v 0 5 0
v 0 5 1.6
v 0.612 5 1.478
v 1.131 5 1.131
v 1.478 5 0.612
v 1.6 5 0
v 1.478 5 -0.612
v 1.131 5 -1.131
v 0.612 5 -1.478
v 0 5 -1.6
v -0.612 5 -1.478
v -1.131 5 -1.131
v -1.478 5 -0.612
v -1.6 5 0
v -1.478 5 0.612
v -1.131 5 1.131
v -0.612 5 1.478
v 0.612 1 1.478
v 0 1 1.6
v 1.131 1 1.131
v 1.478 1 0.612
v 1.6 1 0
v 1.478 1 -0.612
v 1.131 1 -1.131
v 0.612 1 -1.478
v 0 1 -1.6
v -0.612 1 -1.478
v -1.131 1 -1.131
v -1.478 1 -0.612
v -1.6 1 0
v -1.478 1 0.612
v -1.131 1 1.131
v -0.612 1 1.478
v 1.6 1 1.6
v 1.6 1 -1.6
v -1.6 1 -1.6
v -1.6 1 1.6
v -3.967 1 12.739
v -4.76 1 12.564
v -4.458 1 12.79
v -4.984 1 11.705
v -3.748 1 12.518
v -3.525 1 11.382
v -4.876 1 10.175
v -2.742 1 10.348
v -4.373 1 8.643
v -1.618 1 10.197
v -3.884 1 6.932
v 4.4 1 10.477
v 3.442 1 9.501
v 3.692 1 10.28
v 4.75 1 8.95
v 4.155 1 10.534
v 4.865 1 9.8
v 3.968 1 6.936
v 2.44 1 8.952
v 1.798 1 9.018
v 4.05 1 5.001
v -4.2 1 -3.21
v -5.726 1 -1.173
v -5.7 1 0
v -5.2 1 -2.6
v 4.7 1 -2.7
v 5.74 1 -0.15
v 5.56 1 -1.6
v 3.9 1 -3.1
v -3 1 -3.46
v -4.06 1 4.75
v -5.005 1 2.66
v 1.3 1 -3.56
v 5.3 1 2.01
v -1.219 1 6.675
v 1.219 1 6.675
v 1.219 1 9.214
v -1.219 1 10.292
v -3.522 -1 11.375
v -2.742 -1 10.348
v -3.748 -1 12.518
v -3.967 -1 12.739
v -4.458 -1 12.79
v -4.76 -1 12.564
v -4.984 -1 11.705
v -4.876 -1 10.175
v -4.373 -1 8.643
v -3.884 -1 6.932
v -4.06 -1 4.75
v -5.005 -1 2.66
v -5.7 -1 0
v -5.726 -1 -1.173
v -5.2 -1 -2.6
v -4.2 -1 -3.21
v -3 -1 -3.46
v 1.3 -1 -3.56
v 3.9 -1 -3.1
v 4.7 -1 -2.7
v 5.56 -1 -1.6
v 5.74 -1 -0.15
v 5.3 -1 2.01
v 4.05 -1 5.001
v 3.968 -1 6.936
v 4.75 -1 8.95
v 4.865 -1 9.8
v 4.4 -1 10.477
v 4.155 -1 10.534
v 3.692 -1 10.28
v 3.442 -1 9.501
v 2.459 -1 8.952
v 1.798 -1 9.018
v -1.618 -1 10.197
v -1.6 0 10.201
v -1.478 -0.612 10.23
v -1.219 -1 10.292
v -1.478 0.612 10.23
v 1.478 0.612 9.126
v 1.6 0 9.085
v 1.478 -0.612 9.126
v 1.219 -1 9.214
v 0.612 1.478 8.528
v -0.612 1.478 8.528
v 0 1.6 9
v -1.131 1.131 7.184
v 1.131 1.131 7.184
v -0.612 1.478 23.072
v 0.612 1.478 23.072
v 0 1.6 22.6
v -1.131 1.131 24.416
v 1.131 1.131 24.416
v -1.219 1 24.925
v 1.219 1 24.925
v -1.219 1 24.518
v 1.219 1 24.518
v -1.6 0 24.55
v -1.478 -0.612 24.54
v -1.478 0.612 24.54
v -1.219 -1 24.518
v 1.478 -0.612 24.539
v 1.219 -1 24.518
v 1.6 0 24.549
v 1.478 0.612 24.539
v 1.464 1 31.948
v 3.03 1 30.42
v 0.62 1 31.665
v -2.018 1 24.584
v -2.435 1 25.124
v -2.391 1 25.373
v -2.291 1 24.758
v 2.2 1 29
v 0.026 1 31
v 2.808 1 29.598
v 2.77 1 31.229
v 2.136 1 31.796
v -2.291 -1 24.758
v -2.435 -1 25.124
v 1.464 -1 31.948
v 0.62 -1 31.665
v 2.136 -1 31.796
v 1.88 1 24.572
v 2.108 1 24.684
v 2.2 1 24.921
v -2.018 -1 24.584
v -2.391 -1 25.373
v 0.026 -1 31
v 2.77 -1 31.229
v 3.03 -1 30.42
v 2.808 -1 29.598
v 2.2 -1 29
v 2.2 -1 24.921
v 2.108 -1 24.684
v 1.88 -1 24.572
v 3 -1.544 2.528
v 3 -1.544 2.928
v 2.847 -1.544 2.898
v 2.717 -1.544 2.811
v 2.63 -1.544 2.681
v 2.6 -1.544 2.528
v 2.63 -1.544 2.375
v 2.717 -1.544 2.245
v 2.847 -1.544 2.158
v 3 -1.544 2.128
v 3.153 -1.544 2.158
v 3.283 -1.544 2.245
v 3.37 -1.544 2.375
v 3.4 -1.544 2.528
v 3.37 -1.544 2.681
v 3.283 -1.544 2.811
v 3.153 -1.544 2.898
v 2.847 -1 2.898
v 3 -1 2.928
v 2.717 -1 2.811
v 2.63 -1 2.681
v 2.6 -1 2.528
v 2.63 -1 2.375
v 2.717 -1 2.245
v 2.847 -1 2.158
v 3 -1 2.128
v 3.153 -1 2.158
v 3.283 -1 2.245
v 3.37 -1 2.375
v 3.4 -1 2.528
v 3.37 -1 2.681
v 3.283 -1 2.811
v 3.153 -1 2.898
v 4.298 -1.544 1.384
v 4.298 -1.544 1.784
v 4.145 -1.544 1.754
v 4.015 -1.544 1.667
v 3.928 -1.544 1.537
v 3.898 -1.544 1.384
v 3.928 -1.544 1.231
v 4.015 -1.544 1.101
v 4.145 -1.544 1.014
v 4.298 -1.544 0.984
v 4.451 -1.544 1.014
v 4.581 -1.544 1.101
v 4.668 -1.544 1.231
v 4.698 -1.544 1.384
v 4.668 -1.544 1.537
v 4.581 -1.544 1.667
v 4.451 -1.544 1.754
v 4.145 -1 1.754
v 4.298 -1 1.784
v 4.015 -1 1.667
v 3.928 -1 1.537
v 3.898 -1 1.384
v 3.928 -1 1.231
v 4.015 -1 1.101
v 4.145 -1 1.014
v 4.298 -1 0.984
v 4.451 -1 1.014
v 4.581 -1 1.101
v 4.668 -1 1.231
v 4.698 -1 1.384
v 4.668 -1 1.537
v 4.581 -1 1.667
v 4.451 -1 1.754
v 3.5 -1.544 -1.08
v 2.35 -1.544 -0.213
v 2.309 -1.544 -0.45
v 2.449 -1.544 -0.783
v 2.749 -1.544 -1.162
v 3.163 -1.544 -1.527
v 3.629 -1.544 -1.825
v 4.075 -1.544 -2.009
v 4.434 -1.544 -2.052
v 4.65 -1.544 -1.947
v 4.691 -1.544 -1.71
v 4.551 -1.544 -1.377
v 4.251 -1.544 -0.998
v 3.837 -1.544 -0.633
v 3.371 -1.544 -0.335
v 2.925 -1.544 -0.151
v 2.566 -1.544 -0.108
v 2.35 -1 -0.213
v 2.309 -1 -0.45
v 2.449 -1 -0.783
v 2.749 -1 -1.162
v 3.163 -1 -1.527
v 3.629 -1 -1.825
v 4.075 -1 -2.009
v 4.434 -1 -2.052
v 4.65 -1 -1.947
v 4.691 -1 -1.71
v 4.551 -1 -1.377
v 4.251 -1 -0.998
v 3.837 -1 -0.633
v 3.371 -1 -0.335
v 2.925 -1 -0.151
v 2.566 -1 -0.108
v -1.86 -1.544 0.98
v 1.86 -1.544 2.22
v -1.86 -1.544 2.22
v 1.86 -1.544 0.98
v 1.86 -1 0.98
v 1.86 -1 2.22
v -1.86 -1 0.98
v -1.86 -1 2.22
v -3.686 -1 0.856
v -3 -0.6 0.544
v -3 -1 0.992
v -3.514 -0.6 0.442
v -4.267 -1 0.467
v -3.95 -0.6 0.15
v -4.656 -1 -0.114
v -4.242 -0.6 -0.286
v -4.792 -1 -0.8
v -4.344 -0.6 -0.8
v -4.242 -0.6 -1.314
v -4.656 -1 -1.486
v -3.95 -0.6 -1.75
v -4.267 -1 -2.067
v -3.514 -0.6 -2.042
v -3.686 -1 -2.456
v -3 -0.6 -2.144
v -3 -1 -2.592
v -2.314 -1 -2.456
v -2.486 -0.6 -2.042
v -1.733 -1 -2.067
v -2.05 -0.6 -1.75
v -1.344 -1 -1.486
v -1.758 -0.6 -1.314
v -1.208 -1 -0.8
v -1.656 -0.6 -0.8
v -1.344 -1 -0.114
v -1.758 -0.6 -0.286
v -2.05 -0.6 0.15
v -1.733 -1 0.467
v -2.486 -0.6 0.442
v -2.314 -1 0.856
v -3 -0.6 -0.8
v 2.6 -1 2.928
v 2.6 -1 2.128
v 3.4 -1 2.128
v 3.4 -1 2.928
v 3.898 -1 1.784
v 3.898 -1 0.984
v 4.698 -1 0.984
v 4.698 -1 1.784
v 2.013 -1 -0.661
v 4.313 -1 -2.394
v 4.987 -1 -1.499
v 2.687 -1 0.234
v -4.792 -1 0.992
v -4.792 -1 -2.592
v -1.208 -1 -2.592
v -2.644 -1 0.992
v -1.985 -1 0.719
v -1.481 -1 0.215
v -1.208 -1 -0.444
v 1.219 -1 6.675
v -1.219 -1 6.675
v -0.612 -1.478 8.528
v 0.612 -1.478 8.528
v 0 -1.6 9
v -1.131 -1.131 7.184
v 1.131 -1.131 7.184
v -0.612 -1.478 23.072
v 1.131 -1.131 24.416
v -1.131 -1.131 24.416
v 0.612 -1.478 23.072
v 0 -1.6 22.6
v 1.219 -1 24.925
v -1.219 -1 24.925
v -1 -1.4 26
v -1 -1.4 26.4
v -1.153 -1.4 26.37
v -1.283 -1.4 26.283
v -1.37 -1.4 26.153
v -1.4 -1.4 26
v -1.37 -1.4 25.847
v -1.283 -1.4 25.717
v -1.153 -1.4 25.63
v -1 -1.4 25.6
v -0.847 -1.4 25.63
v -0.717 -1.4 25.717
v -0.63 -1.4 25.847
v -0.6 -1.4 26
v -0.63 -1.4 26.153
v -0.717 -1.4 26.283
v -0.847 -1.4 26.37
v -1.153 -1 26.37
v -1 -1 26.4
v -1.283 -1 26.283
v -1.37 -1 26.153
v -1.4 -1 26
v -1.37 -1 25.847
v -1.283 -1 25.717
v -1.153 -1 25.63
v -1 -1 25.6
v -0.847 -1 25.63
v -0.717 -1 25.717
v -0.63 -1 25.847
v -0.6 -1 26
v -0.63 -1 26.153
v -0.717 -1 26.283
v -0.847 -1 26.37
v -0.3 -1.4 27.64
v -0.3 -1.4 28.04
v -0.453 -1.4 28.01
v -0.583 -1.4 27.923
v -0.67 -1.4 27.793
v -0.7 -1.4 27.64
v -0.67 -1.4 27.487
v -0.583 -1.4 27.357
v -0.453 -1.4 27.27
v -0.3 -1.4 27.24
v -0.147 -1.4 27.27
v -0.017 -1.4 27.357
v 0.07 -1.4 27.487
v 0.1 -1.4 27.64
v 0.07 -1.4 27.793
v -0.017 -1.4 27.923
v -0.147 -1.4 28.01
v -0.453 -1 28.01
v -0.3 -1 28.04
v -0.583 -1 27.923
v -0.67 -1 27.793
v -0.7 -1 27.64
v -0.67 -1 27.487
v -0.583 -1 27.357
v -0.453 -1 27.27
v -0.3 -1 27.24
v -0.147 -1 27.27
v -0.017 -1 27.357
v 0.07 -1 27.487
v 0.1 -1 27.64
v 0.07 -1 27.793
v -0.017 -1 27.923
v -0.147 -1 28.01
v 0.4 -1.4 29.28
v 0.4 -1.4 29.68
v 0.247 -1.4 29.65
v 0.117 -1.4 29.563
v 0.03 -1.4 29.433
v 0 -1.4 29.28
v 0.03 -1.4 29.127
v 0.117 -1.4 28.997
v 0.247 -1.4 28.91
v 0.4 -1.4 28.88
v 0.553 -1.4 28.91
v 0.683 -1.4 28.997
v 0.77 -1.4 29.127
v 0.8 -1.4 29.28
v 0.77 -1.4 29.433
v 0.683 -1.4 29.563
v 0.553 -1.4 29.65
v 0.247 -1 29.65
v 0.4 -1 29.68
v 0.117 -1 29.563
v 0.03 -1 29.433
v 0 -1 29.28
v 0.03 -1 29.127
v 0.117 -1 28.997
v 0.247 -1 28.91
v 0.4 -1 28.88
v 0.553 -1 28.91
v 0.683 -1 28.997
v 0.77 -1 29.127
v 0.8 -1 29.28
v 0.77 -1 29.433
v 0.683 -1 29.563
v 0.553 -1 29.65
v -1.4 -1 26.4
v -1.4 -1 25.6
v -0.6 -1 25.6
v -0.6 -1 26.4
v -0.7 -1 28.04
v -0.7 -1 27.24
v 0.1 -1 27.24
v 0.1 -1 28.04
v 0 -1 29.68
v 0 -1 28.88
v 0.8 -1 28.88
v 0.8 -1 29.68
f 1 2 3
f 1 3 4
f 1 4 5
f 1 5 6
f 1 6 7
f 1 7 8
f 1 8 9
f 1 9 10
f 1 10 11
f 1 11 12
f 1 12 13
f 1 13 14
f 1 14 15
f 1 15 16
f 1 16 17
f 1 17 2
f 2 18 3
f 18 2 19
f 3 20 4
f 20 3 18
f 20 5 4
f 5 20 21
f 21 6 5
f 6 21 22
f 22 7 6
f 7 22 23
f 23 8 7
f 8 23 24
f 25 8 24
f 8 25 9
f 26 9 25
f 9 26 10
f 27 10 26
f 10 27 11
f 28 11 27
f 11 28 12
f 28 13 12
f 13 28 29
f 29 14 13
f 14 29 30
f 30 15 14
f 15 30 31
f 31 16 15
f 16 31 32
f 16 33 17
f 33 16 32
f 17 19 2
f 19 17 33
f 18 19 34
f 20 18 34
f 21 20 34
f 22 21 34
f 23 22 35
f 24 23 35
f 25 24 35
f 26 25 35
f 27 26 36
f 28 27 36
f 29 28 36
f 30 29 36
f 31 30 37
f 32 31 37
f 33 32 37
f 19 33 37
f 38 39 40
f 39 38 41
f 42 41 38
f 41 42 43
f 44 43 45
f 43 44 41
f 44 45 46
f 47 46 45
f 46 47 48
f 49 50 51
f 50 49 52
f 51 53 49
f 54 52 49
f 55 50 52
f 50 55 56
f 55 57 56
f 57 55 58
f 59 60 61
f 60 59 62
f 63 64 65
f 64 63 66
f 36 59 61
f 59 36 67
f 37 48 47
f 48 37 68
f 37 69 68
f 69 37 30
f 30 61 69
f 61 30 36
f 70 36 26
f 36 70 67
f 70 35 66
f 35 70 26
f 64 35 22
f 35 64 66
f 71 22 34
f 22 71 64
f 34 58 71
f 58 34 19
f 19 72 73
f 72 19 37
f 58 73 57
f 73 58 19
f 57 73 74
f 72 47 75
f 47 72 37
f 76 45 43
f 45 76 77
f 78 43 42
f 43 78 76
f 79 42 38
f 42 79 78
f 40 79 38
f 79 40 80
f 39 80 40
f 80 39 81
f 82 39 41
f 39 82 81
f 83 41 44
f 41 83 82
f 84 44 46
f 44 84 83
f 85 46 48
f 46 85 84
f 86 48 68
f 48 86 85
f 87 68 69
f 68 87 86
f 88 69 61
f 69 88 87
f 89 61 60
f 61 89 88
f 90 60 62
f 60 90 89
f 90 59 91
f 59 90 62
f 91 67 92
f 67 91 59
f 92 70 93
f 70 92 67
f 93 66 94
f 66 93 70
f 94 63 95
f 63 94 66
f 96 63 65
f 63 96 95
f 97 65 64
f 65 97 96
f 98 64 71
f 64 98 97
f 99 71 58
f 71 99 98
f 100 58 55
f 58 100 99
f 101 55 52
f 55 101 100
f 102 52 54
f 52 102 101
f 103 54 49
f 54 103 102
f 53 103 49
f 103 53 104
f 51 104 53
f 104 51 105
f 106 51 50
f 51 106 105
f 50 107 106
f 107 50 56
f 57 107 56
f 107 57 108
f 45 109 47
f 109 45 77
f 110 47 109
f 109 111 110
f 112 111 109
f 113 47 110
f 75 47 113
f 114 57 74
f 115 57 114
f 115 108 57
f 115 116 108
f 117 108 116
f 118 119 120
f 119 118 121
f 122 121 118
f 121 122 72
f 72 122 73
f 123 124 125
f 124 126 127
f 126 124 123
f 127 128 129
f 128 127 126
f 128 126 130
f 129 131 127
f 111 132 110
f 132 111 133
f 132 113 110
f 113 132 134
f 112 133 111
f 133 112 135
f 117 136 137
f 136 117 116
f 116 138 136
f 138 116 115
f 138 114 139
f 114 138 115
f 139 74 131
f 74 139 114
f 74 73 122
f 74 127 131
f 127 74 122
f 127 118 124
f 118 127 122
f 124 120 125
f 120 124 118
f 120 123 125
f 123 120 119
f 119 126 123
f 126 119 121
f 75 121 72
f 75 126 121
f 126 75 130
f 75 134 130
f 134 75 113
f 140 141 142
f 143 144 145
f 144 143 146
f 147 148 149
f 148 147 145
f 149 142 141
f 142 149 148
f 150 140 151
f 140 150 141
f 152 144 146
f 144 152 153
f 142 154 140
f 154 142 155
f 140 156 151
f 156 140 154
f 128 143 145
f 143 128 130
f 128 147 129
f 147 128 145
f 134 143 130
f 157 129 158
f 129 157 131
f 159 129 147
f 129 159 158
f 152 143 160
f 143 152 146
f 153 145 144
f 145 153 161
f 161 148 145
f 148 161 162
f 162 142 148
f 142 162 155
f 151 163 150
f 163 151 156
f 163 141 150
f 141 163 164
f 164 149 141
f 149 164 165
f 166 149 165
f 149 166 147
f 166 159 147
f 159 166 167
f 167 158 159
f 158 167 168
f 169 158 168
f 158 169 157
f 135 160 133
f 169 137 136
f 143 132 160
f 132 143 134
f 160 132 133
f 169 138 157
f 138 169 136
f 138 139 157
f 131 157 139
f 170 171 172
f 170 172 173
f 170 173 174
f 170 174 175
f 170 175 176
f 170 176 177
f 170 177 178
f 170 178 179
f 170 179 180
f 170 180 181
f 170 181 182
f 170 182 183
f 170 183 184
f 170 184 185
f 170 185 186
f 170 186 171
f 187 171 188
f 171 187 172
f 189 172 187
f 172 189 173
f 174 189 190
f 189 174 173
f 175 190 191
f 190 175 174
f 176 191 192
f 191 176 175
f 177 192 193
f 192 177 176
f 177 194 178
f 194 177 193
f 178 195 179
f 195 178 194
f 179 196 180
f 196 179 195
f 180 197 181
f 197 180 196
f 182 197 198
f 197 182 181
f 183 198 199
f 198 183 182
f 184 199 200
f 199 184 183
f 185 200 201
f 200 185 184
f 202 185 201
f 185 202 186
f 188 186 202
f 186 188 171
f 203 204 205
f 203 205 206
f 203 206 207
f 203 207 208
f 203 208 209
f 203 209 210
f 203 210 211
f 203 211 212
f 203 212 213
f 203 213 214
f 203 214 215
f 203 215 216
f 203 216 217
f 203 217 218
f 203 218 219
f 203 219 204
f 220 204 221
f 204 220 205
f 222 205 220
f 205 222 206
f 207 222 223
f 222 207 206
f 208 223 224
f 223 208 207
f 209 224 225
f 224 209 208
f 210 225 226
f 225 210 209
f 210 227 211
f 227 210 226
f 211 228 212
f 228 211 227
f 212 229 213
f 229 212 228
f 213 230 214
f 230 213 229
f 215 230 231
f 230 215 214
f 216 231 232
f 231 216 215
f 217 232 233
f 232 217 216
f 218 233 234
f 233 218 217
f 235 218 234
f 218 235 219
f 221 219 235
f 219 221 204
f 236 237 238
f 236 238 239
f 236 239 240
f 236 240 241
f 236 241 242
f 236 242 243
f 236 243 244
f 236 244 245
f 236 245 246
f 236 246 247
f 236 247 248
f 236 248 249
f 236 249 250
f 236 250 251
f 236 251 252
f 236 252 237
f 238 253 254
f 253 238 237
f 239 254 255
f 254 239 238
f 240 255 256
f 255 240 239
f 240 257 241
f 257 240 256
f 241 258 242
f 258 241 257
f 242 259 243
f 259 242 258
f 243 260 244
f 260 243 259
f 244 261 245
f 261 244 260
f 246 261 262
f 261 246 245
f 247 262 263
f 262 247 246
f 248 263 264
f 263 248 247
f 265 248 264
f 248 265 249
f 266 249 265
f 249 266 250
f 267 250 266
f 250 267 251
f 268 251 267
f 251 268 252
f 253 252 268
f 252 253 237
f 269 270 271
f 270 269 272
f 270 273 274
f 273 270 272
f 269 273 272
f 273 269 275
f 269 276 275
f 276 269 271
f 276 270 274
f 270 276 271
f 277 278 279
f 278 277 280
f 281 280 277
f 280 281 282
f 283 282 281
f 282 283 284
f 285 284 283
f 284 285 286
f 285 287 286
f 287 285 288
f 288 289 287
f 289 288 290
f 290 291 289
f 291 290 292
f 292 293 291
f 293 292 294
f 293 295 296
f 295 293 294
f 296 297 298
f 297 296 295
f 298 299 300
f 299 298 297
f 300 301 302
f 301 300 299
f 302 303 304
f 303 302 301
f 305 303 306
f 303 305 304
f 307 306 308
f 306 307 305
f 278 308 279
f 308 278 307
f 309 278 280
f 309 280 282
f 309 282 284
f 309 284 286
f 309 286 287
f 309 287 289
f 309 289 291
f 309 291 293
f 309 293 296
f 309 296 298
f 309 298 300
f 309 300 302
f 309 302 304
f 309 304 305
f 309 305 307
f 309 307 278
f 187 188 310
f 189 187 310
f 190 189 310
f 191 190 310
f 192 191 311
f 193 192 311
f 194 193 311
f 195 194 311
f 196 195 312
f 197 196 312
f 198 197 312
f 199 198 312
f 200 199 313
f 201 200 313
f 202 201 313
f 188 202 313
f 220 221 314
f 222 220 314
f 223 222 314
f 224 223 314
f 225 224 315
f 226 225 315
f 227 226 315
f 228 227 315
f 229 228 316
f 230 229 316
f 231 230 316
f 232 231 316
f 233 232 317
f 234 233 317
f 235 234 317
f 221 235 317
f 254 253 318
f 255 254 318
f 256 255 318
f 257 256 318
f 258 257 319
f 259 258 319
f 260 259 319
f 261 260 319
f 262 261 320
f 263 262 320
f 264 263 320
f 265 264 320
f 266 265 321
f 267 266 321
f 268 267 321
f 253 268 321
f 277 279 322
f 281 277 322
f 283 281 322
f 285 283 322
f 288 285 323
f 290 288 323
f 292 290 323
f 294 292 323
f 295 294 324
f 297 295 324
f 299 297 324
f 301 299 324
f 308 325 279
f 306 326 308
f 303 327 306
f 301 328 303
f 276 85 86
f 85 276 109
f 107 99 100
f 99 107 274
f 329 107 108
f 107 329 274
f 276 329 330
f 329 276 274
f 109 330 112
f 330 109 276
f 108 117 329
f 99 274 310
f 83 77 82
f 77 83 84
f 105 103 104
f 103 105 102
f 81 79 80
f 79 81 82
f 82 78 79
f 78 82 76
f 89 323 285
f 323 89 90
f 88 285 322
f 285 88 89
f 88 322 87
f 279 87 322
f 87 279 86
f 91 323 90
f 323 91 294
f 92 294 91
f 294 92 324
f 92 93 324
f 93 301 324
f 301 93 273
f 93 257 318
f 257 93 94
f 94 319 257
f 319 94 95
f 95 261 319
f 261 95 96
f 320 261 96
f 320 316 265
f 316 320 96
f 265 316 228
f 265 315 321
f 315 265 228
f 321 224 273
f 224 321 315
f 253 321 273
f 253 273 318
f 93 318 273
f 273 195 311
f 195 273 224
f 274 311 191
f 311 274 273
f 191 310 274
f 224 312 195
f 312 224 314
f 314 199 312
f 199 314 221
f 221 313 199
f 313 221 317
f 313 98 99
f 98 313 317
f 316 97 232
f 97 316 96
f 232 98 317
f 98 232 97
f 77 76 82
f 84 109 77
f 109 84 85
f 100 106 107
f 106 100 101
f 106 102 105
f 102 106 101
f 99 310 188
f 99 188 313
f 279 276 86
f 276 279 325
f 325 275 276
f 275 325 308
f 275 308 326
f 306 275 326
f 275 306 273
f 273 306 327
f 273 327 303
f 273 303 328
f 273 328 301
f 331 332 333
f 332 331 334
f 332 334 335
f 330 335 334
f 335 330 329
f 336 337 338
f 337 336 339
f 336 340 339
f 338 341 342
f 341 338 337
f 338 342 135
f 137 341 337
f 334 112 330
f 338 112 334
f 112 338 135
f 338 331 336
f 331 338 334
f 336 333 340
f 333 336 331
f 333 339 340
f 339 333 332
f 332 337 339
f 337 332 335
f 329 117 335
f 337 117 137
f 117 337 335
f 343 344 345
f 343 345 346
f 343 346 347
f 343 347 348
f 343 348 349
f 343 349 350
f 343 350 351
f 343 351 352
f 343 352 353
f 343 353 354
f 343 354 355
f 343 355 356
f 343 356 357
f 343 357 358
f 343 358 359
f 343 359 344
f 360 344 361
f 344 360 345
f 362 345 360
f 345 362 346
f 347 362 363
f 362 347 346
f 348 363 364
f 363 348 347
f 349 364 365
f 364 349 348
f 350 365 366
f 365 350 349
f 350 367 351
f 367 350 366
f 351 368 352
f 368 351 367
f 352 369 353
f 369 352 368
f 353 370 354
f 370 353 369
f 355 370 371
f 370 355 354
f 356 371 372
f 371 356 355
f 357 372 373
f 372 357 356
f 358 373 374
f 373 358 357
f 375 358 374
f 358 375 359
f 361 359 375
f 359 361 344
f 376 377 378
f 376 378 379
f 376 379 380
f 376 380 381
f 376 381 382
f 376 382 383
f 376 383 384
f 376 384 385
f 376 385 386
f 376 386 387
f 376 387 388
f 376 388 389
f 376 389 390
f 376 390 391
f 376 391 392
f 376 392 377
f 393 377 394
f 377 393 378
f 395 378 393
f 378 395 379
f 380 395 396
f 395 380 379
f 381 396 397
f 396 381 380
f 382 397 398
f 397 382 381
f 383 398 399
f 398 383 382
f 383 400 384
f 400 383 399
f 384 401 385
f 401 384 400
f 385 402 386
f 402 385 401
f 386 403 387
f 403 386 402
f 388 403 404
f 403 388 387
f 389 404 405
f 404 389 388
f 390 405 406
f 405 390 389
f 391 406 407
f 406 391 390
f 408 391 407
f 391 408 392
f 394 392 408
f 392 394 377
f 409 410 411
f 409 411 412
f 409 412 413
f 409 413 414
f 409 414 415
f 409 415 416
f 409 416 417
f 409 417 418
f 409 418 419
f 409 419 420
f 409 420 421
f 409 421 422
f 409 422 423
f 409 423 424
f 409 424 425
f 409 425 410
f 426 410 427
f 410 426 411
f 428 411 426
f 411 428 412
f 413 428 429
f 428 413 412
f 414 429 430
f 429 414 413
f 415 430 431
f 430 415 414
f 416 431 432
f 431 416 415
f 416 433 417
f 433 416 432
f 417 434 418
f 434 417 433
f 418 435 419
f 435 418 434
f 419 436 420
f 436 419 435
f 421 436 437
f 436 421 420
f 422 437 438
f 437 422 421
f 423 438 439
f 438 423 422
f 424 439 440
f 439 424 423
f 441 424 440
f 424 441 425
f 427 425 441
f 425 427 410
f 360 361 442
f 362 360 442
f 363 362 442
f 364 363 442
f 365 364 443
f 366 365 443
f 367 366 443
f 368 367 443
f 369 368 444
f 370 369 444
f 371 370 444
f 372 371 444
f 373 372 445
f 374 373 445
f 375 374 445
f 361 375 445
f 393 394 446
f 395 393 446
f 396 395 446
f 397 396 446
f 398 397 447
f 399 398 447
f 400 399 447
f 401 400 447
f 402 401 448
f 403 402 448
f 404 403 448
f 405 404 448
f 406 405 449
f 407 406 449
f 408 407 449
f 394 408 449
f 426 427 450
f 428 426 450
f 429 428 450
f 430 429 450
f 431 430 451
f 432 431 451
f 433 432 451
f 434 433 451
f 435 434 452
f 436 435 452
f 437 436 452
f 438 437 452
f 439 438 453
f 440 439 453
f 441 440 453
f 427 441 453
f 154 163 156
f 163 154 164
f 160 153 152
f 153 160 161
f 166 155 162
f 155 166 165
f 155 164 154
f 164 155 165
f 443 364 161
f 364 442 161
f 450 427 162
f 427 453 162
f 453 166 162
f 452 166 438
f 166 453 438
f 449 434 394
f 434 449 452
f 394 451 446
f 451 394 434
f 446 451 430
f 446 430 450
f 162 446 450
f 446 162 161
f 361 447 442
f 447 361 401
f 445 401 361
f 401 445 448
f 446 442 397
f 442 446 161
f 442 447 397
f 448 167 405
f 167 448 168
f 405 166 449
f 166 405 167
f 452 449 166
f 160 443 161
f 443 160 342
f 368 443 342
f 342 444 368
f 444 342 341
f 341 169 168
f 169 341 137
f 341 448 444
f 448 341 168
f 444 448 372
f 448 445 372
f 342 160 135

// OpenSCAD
use <../lib.scad>
use <../p/1-4tang.scad>
use <../p/3-4ndis.scad>
use <../p/4-4con3.scad>
use <../p/4-4cylc.scad>
use <../p/4-4disc.scad>
use <../p/4-4edge.scad>
use <../p/4-4ndis.scad>
use <../p/box5.scad>
use <s/11640s01.scad>
function ldraw_lib__11640() = [
// 0 Minifig Electric Guitar Classic
// 0 Name: 11640.dat
// 0 Author: Evert-Jan Boer [ejboer]
// 0 !LDRAW_ORG Part UPDATE 2022-01
// 0 !LICENSE Licensed under CC BY 2.0 and CC BY 4.0 : see CAreadme.txt
// 
// 0 BFC CERTIFY CCW
  [0,"BFC","CERTIFY"],
  [0,"BFC","CCW"],
// 
// 0 !CATEGORY Minifig Accessory
// 
// 0 !HISTORY 2013-08-14 {LEGO Digital Designer} Original part shape
// 0 !HISTORY 2017-03-08 [ejboer] File preparation for LDraw Parts Tracker
// 0 !HISTORY 2018-12-08 [PTadmin] Official Update 2018-02
// 0 !HISTORY 2021-10-05 [RainbowDolphin] Fixed surface overlap
// 0 !HISTORY 2022-01-14 [PTadmin] Official Update 2022-01
// 
// 
// 1 16 0 0 0 1 0 0 0 1 0 0 0 1 s\11640s01.dat
  [1,16,0,0,0,1,0,0,0,1,0,0,0,1, ldraw_lib__s__11640s01()],
// 
// 0 // Body
// 1 16 7.5 -6.32 -3.86 0 0 -1 -1 0 0 0 1.36 0 4-4cylc.dat
  [1,16,7.5,-6.32,-3.86,0,0,-1,-1,0,0,0,1.36,0, ldraw_lib__4_4cylc()],
// 1 16 10.745 -3.46 -3.86 0 0 -1 -1 0 0 0 1.36 0 4-4cylc.dat
  [1,16,10.745,-3.46,-3.86,0,0,-1,-1,0,0,0,1.36,0, ldraw_lib__4_4cylc()],
// 1 16 8.75 2.7 -3.86 -2.87509 0 -0.842541 -2.16653 0 1.11809 0 1.36 0 4-4cylc.dat
  [1,16,8.75,2.7,-3.86,-2.87509,0,-0.842541,-2.16653,0,1.11809,0,1.36,0, ldraw_lib__4_4cylc()],
// 1 16 0 -4 -2.5 0 0 4.65 -1.55 0 0 0 -1.36 0 box5.dat
  [1,16,0,-4,-2.5,0,0,4.65,-1.55,0,0,0,-1.36,0, ldraw_lib__box5()],
// 0 BFC INVERTNEXT
  [0,"BFC","INVERTNEXT"],
// 1 16 -7.5 2 -2.5 0 0 -1.12 -1.12 0 0 0 1 0 4-4con3.dat
  [1,16,-7.5,2,-2.5,0,0,-1.12,-1.12,0,0,0,1,0, ldraw_lib__4_4con3()],
// 1 16 -7.5 2 -1.5 0 0 -3.36 -3.36 0 0 0 1 0 4-4disc.dat
  [1,16,-7.5,2,-1.5,0,0,-3.36,-3.36,0,0,0,1,0, ldraw_lib__4_4disc()],
// 1 16 -7.5 2 -1.5 0 0 -3.36 -3.36 0 0 0 1 0 4-4edge.dat
  [1,16,-7.5,2,-1.5,0,0,-3.36,-3.36,0,0,0,1,0, ldraw_lib__4_4edge()],
// 1 16 -7.5 2 -2.5 0 0 -4.48 -4.48 0 0 0 1 0 4-4edge.dat
  [1,16,-7.5,2,-2.5,0,0,-4.48,-4.48,0,0,0,1,0, ldraw_lib__4_4edge()],
// 1 16 7.5 -6.32 -2.5 0 0 -1 -1 0 0 0 1 0 4-4ndis.dat
  [1,16,7.5,-6.32,-2.5,0,0,-1,-1,0,0,0,1,0, ldraw_lib__4_4ndis()],
// 1 16 10.745 -3.46 -2.5 0 0 -1 -1 0 0 0 1 0 4-4ndis.dat
  [1,16,10.745,-3.46,-2.5,0,0,-1,-1,0,0,0,1,0, ldraw_lib__4_4ndis()],
// 1 16 8.75 2.7 -2.5 -2.87509 0 -0.842541 -2.16653 0 1.11809 0 1 0 4-4ndis.dat
  [1,16,8.75,2.7,-2.5,-2.87509,0,-0.842541,-2.16653,0,1.11809,0,1,0, ldraw_lib__4_4ndis()],
// 1 16 -7.5 2 -2.5 0 0 -4.48 -4.48 0 0 0 1 0 3-4ndis.dat
  [1,16,-7.5,2,-2.5,0,0,-4.48,-4.48,0,0,0,1,0, ldraw_lib__3_4ndis()],
// 1 16 -7.5 2 -2.5 0 0 4.48 -4.48 0 0 0 1 0 1-4tang.dat
  [1,16,-7.5,2,-2.5,0,0,4.48,-4.48,0,0,0,1,0, ldraw_lib__1_4tang()],
// 
// 4 16 -9.711 -17.33 -2.5 -10.15 -11.875 -2.5 -4.65 -5.55 -2.5 -4.044 -25.493 -2.5
  [4,16,-9.711,-17.33,-2.5,-10.15,-11.875,-2.5,-4.65,-5.55,-2.5,-4.044,-25.493,-2.5],
// 4 16 4.65 -5.55 -2.5 10.124 -12.502 -2.5 9.92 -17.34 -2.5 6.148 -22.38 -2.5
  [4,16,4.65,-5.55,-2.5,10.124,-12.502,-2.5,9.92,-17.34,-2.5,6.148,-22.38,-2.5],
// 4 16 4.65 -5.55 -2.5 6.148 -22.38 -2.5 4.496 -22.546 -2.5 3.04787 -16.6875 -2.5
  [4,16,4.65,-5.55,-2.5,6.148,-22.38,-2.5,4.496,-22.546,-2.5,3.04787,-16.6875,-2.5],
// 4 16 -3.04787 -16.6875 -2.5 -4.65 -5.55 -2.5 4.65 -5.55 -2.5 3.04787 -16.6875 -2.5
  [4,16,-3.04787,-16.6875,-2.5,-4.65,-5.55,-2.5,4.65,-5.55,-2.5,3.04787,-16.6875,-2.5],
// 4 16 -4.044 -25.493 -2.5 -4.65 -5.55 -2.5 -3.04787 -16.6875 -2.5 -3.04791 -25.7296 -2.5
  [4,16,-4.044,-25.493,-2.5,-4.65,-5.55,-2.5,-3.04787,-16.6875,-2.5,-3.04791,-25.7296,-2.5],
// 3 16 4.496 -22.546 -2.5 3.04791 -23.0339 -2.5 3.04787 -16.6875 -2.5
  [3,16,4.496,-22.546,-2.5,3.04791,-23.0339,-2.5,3.04787,-16.6875,-2.5],
// 3 16 10.124 -12.502 -2.5 4.65 -5.55 -2.5 6.5 -7.32 -2.5
  [3,16,10.124,-12.502,-2.5,4.65,-5.55,-2.5,6.5,-7.32,-2.5],
// 4 16 -12.191 -25.437 -2.5 -10.932 -21.607 -2.5 -6.854 -25.87 -2.5 -12.46 -29.263 -2.5
  [4,16,-12.191,-25.437,-2.5,-10.932,-21.607,-2.5,-6.854,-25.87,-2.5,-12.46,-29.263,-2.5],
// 4 16 11 -26.193 -2.5 10.388 -26.336 -2.5 9.229 -25.701 -2.5 12.162 -24.5 -2.5
  [4,16,11,-26.193,-2.5,10.388,-26.336,-2.5,9.229,-25.701,-2.5,12.162,-24.5,-2.5],
// 4 16 -9.918 -31.847 -2.5 -11.144 -31.974 -2.5 -11.9 -31.411 -2.5 -12.46 -29.263 -2.5
  [4,16,-9.918,-31.847,-2.5,-11.144,-31.974,-2.5,-11.9,-31.411,-2.5,-12.46,-29.263,-2.5],
// 4 16 -9.37 -31.296 -2.5 -9.918 -31.847 -2.5 -12.46 -29.263 -2.5 -8.805 -28.438 -2.5
  [4,16,-9.37,-31.296,-2.5,-9.918,-31.847,-2.5,-12.46,-29.263,-2.5,-8.805,-28.438,-2.5],
// 4 16 -14.314 2.932 -2.5 -13 6.5 -2.5 -11.98 6.48 -2.5 -11.98 2 -2.5
  [4,16,-14.314,2.932,-2.5,-13,6.5,-2.5,-11.98,6.48,-2.5,-11.98,2,-2.5],
// 4 16 -14.25 0 -2.5 -14.314 2.932 -2.5 -11.98 2 -2.5 -11.98 -2.48 -2.5
  [4,16,-14.25,0,-2.5,-14.314,2.932,-2.5,-11.98,2,-2.5,-11.98,-2.48,-2.5],
// 3 16 -14.25 0 -2.5 -11.98 -2.48 -2.5 -12.513 -6.65 -2.5
  [3,16,-14.25,0,-2.5,-11.98,-2.48,-2.5,-12.513,-6.65,-2.5],
// 4 16 -12.513 -6.65 -2.5 -11.98 -2.48 -2.5 -7.5 -2.48 -2.5 -10.15 -11.875 -2.5
  [4,16,-12.513,-6.65,-2.5,-11.98,-2.48,-2.5,-7.5,-2.48,-2.5,-10.15,-11.875,-2.5],
// 4 16 -11.98 6.48 -2.5 -13 6.5 -2.5 -10.5 8.025 -2.5 -7.5 6.48 -2.5
  [4,16,-11.98,6.48,-2.5,-13,6.5,-2.5,-10.5,8.025,-2.5,-7.5,6.48,-2.5],
// 4 16 -7.5 6.48 -2.5 -10.5 8.025 -2.5 -7.5 8.65 -2.5 -3.02 6.48 -2.5
  [4,16,-7.5,6.48,-2.5,-10.5,8.025,-2.5,-7.5,8.65,-2.5,-3.02,6.48,-2.5],
// 3 16 -7.5 8.65 -2.5 3.25 8.9 -2.5 -3.02 6.48 -2.5
  [3,16,-7.5,8.65,-2.5,3.25,8.9,-2.5,-3.02,6.48,-2.5],
// 4 16 -3.02 2 -2.5 -3.02 6.48 -2.5 3.25 8.9 -2.5 4.65 -2.45 -2.5
  [4,16,-3.02,2,-2.5,-3.02,6.48,-2.5,3.25,8.9,-2.5,4.65,-2.45,-2.5],
// 4 16 7.90746 3.8181 -2.5 5.03237 1.6516 -2.5 3.25 8.9 -2.5 9.75 7.75 -2.5
  [4,16,7.90746,3.8181,-2.5,5.03237,1.6516,-2.5,3.25,8.9,-2.5,9.75,7.75,-2.5],
// 4 16 10.7825 5.9846 -2.5 7.90746 3.8181 -2.5 9.75 7.75 -2.5 11.75 6.75 -2.5
  [4,16,10.7825,5.9846,-2.5,7.90746,3.8181,-2.5,9.75,7.75,-2.5,11.75,6.75,-2.5],
// 4 16 11.6251 4.8665 -2.5 10.7825 5.9846 -2.5 11.75 6.75 -2.5 13.9 4 -2.5
  [4,16,11.6251,4.8665,-2.5,10.7825,5.9846,-2.5,11.75,6.75,-2.5,13.9,4,-2.5],
// 3 16 12.4676 3.7484 -2.5 11.6251 4.8665 -2.5 13.9 4 -2.5
  [3,16,12.4676,3.7484,-2.5,11.6251,4.8665,-2.5,13.9,4,-2.5],
// 4 16 12.4676 3.7484 -2.5 13.9 4 -2.5 11.745 -2.46 -2.5 9.59254 1.5819 -2.5
  [4,16,12.4676,3.7484,-2.5,13.9,4,-2.5,11.745,-2.46,-2.5,9.59254,1.5819,-2.5],
// 3 16 9.59254 1.5819 -2.5 11.745 -2.46 -2.5 10.745 -2.46 -2.5
  [3,16,9.59254,1.5819,-2.5,11.745,-2.46,-2.5,10.745,-2.46,-2.5],
// 4 16 9.59254 1.5819 -2.5 10.745 -2.46 -2.5 9.745 -2.46 -2.5 6.71745 -0.5846 -2.5
  [4,16,9.59254,1.5819,-2.5,10.745,-2.46,-2.5,9.745,-2.46,-2.5,6.71745,-0.5846,-2.5],
// 4 16 4.65 -2.45 -2.5 6.71745 -0.5846 -2.5 9.745 -2.46 -2.5 9.745 -3.46 -2.5
  [4,16,4.65,-2.45,-2.5,6.71745,-0.5846,-2.5,9.745,-2.46,-2.5,9.745,-3.46,-2.5],
// 3 16 5.87491 0.5335 -2.5 6.71745 -0.5846 -2.5 4.65 -2.45 -2.5
  [3,16,5.87491,0.5335,-2.5,6.71745,-0.5846,-2.5,4.65,-2.45,-2.5],
// 3 16 5.87491 0.5335 -2.5 4.65 -2.45 -2.5 5.03237 1.6516 -2.5
  [3,16,5.87491,0.5335,-2.5,4.65,-2.45,-2.5,5.03237,1.6516,-2.5],
// 3 16 3.25 8.9 -2.5 5.03237 1.6516 -2.5 4.65 -2.45 -2.5
  [3,16,3.25,8.9,-2.5,5.03237,1.6516,-2.5,4.65,-2.45,-2.5],
// 4 16 4.65 -2.45 -2.5 9.745 -3.46 -2.5 7.5 -5.32 -2.5 6.5 -5.32 -2.5
  [4,16,4.65,-2.45,-2.5,9.745,-3.46,-2.5,7.5,-5.32,-2.5,6.5,-5.32,-2.5],
// 4 16 4.65 -5.55 -2.5 4.65 -2.45 -2.5 6.5 -5.32 -2.5 6.5 -6.32 -2.5
  [4,16,4.65,-5.55,-2.5,4.65,-2.45,-2.5,6.5,-5.32,-2.5,6.5,-6.32,-2.5],
// 3 16 6.5 -6.32 -2.5 6.5 -7.32 -2.5 4.65 -5.55 -2.5
  [3,16,6.5,-6.32,-2.5,6.5,-7.32,-2.5,4.65,-5.55,-2.5],
// 4 16 8.5 -5.32 -2.5 7.5 -5.32 -2.5 9.745 -3.46 -2.5 9.745 -4.46 -2.5
  [4,16,8.5,-5.32,-2.5,7.5,-5.32,-2.5,9.745,-3.46,-2.5,9.745,-4.46,-2.5],
// 4 16 8.5 -5.32 -2.5 9.745 -4.46 -2.5 10.745 -4.46 -2.5 8.5 -6.32 -2.5
  [4,16,8.5,-5.32,-2.5,9.745,-4.46,-2.5,10.745,-4.46,-2.5,8.5,-6.32,-2.5],
// 4 16 8.5 -6.32 -2.5 10.745 -4.46 -2.5 11.745 -4.46 -2.5 8.5 -7.32 -2.5
  [4,16,8.5,-6.32,-2.5,10.745,-4.46,-2.5,11.745,-4.46,-2.5,8.5,-7.32,-2.5],
// 4 16 8.5 -7.32 -2.5 11.745 -4.46 -2.5 13.25 -5.025 -2.5 10.124 -12.502 -2.5
  [4,16,8.5,-7.32,-2.5,11.745,-4.46,-2.5,13.25,-5.025,-2.5,10.124,-12.502,-2.5],
// 4 16 11.745 -2.46 -2.5 13.9 4 -2.5 14.35 0.375 -2.5 11.745 -3.46 -2.5
  [4,16,11.745,-2.46,-2.5,13.9,4,-2.5,14.35,0.375,-2.5,11.745,-3.46,-2.5],
// 4 16 11.745 -3.46 -2.5 14.35 0.375 -2.5 13.25 -5.025 -2.5 11.745 -4.46 -2.5
  [4,16,11.745,-3.46,-2.5,14.35,0.375,-2.5,13.25,-5.025,-2.5,11.745,-4.46,-2.5],
// 3 16 -6.854 -25.87 -2.5 -8.805 -28.438 -2.5 -12.46 -29.263 -2.5
  [3,16,-6.854,-25.87,-2.5,-8.805,-28.438,-2.5,-12.46,-29.263,-2.5],
// 4 16 -6.854 -25.87 -2.5 -10.932 -21.607 -2.5 -9.711 -17.33 -2.5 -4.044 -25.493 -2.5
  [4,16,-6.854,-25.87,-2.5,-10.932,-21.607,-2.5,-9.711,-17.33,-2.5,-4.044,-25.493,-2.5],
// 4 16 8.606 -23.753 -2.5 6.148 -22.38 -2.5 9.92 -17.34 -2.5 11.875 -22.3741 -2.5
  [4,16,8.606,-23.753,-2.5,6.148,-22.38,-2.5,9.92,-17.34,-2.5,11.875,-22.3741,-2.5],
// 4 16 9.229 -25.701 -2.5 8.606 -23.753 -2.5 11.875 -22.3741 -2.5 12.162 -24.5 -2.5
  [4,16,9.229,-25.701,-2.5,8.606,-23.753,-2.5,11.875,-22.3741,-2.5,12.162,-24.5,-2.5],
// 3 16 10.124 -12.502 -2.5 6.5 -7.32 -2.5 7.5 -7.32 -2.5
  [3,16,10.124,-12.502,-2.5,6.5,-7.32,-2.5,7.5,-7.32,-2.5],
// 3 16 10.124 -12.502 -2.5 7.5 -7.32 -2.5 8.5 -7.32 -2.5
  [3,16,10.124,-12.502,-2.5,7.5,-7.32,-2.5,8.5,-7.32,-2.5],
// 4 16 -6.608928 -2.48 -2.5 -4.65 -5.55 -2.5 -10.15 -11.875 -2.5 -7.5 -2.48 -2.5
  [4,16,-6.608928,-2.48,-2.5,-4.65,-5.55,-2.5,-10.15,-11.875,-2.5,-7.5,-2.48,-2.5],
// 4 16 -5.785504 -2.139072 -2.5 -4.65 -2.45 -2.5 -4.65 -5.55 -2.5 -6.608928 -2.48 -2.5
  [4,16,-5.785504,-2.139072,-2.5,-4.65,-2.45,-2.5,-4.65,-5.55,-2.5,-6.608928,-2.48,-2.5],
// 3 16 -4.65 -2.45 -2.5 -5.785504 -2.139072 -2.5 -4.96208 -1.798144 -2.5
  [3,16,-4.65,-2.45,-2.5,-5.785504,-2.139072,-2.5,-4.96208,-1.798144,-2.5],
// 4 16 4.65 -2.45 -2.5 -4.65 -2.45 -2.5 -4.96208 -1.798144 -2.5 -4.332192 -1.167808 -2.5
  [4,16,4.65,-2.45,-2.5,-4.65,-2.45,-2.5,-4.96208,-1.798144,-2.5,-4.332192,-1.167808,-2.5],
// 3 16 4.65 -2.45 -2.5 -4.332192 -1.167808 -2.5 -3.701856 -.53792 -2.5
  [3,16,4.65,-2.45,-2.5,-4.332192,-1.167808,-2.5,-3.701856,-.53792,-2.5],
// 3 16 4.65 -2.45 -2.5 -3.701856 -.53792 -2.5 -3.360928 .285504 -2.5
  [3,16,4.65,-2.45,-2.5,-3.701856,-.53792,-2.5,-3.360928,.285504,-2.5],
// 3 16 4.65 -2.45 -2.5 -3.360928 .285504 -2.5 -3.02 1.108928 -2.5
  [3,16,4.65,-2.45,-2.5,-3.360928,.285504,-2.5,-3.02,1.108928,-2.5],
// 3 16 4.65 -2.45 -2.5 -3.02 1.108928 -2.5 -3.02 2 -2.5
  [3,16,4.65,-2.45,-2.5,-3.02,1.108928,-2.5,-3.02,2,-2.5],
// 0 // Neck
// 4 16 1.5308 -21.3205 -3.6956 0 -22.5 -4 -1.5308 -21.3205 -3.6956 -2.8284 -17.96 -2.8284
  [4,16,1.5308,-21.3205,-3.6956,0,-22.5,-4,-1.5308,-21.3205,-3.6956,-2.8284,-17.96,-2.8284],
// 3 16 1.5308 -21.3205 -3.6956 -2.8284 -17.96 -2.8284 2.8284 -17.96 -2.8284
  [3,16,1.5308,-21.3205,-3.6956,-2.8284,-17.96,-2.8284,2.8284,-17.96,-2.8284],
// 4 16 -2.8284 -17.96 -2.8284 -3.04787 -16.6875 -2.5 3.04787 -16.6875 -2.5 2.8284 -17.96 -2.8284
  [4,16,-2.8284,-17.96,-2.8284,-3.04787,-16.6875,-2.5,3.04787,-16.6875,-2.5,2.8284,-17.96,-2.8284],
// 4 16 -2.8284 -61.04 -2.8284 -1.5308 -57.6795 -3.6956 1.5308 -57.6795 -3.6956 2.8284 -61.04 -2.8284
  [4,16,-2.8284,-61.04,-2.8284,-1.5308,-57.6795,-3.6956,1.5308,-57.6795,-3.6956,2.8284,-61.04,-2.8284],
// 3 16 -1.5308 -57.6795 -3.6956 0 -56.5 -4 1.5308 -57.6795 -3.6956
  [3,16,-1.5308,-57.6795,-3.6956,0,-56.5,-4,1.5308,-57.6795,-3.6956],
// 4 16 3.04787 -62.3125 -2.5 -3.04787 -62.3125 -2.5 -2.8284 -61.04 -2.8284 2.8284 -61.04 -2.8284
  [4,16,3.04787,-62.3125,-2.5,-3.04787,-62.3125,-2.5,-2.8284,-61.04,-2.8284,2.8284,-61.04,-2.8284],
// 3 16 -2.8284 -61.04 -2.8284 -3.04787 -62.3125 -2.5 -3.04787 -61.2959 -2.5
  [3,16,-2.8284,-61.04,-2.8284,-3.04787,-62.3125,-2.5,-3.04787,-61.2959,-2.5],
// 3 16 3.04787 -61.2959 -2.5 3.04787 -62.3125 -2.5 2.8284 -61.04 -2.8284
  [3,16,3.04787,-61.2959,-2.5,3.04787,-62.3125,-2.5,2.8284,-61.04,-2.8284],
// 3 16 -2.8284 -17.96 -2.8284 -3.04791 -25.7296 -2.5 -3.04787 -16.6875 -2.5
  [3,16,-2.8284,-17.96,-2.8284,-3.04791,-25.7296,-2.5,-3.04787,-16.6875,-2.5],
// 4 16 -2.8284 -61.04 -2.8284 -3.04787 -61.2959 -2.5 -3.04791 -25.7296 -2.5 -2.8284 -17.96 -2.8284
  [4,16,-2.8284,-61.04,-2.8284,-3.04787,-61.2959,-2.5,-3.04791,-25.7296,-2.5,-2.8284,-17.96,-2.8284],
// 4 16 -2.8284 -61.04 -2.8284 -2.8284 -17.96 -2.8284 -1.5308 -21.3205 -3.6956 -1.5308 -57.6795 -3.6956
  [4,16,-2.8284,-61.04,-2.8284,-2.8284,-17.96,-2.8284,-1.5308,-21.3205,-3.6956,-1.5308,-57.6795,-3.6956],
// 4 16 -1.5308 -57.6795 -3.6956 -1.5308 -21.3205 -3.6956 0 -22.5 -4 0 -56.5 -4
  [4,16,-1.5308,-57.6795,-3.6956,-1.5308,-21.3205,-3.6956,0,-22.5,-4,0,-56.5,-4],
// 4 16 0 -56.5 -4 0 -22.5 -4 1.5308 -21.3205 -3.6956 1.5308 -57.6795 -3.6956
  [4,16,0,-56.5,-4,0,-22.5,-4,1.5308,-21.3205,-3.6956,1.5308,-57.6795,-3.6956],
// 4 16 1.5308 -57.6795 -3.6956 1.5308 -21.3205 -3.6956 2.8284 -17.96 -2.8284 2.8284 -61.04 -2.8284
  [4,16,1.5308,-57.6795,-3.6956,1.5308,-21.3205,-3.6956,2.8284,-17.96,-2.8284,2.8284,-61.04,-2.8284],
// 3 16 3.04787 -16.6875 -2.5 3.04791 -23.0339 -2.5 2.8284 -17.96 -2.8284
  [3,16,3.04787,-16.6875,-2.5,3.04791,-23.0339,-2.5,2.8284,-17.96,-2.8284],
// 4 16 2.8284 -61.04 -2.8284 2.8284 -17.96 -2.8284 3.04791 -23.0339 -2.5 3.04787 -61.2959 -2.5
  [4,16,2.8284,-61.04,-2.8284,2.8284,-17.96,-2.8284,3.04791,-23.0339,-2.5,3.04787,-61.2959,-2.5],
// 
// 2 24 -2.8284 -61.04 -2.8284 -1.5308 -57.6795 -3.6956
  [2,24,-2.8284,-61.04,-2.8284,-1.5308,-57.6795,-3.6956],
// 2 24 -1.5308 -57.6795 -3.6956 0 -56.5 -4
  [2,24,-1.5308,-57.6795,-3.6956,0,-56.5,-4],
// 2 24 0 -56.5 -4 1.5308 -57.6795 -3.6956
  [2,24,0,-56.5,-4,1.5308,-57.6795,-3.6956],
// 2 24 1.5308 -57.6795 -3.6956 2.8284 -61.04 -2.8284
  [2,24,1.5308,-57.6795,-3.6956,2.8284,-61.04,-2.8284],
// 2 24 -3.04787 -16.6875 -2.5 -2.8284 -17.96 -2.8284
  [2,24,-3.04787,-16.6875,-2.5,-2.8284,-17.96,-2.8284],
// 2 24 -2.8284 -17.96 -2.8284 -1.5308 -21.3205 -3.6956
  [2,24,-2.8284,-17.96,-2.8284,-1.5308,-21.3205,-3.6956],
// 2 24 -1.5308 -21.3205 -3.6956 0 -22.5 -4
  [2,24,-1.5308,-21.3205,-3.6956,0,-22.5,-4],
// 2 24 0 -22.5 -4 1.5308 -21.3205 -3.6956
  [2,24,0,-22.5,-4,1.5308,-21.3205,-3.6956],
// 2 24 1.5308 -21.3205 -3.6956 2.8284 -17.96 -2.8284
  [2,24,1.5308,-21.3205,-3.6956,2.8284,-17.96,-2.8284],
// 2 24 2.8284 -17.96 -2.8284 3.04787 -16.6875 -2.5
  [2,24,2.8284,-17.96,-2.8284,3.04787,-16.6875,-2.5],
// 2 24 3.04787 -62.3125 -2.5 2.8284 -61.04 -2.8284
  [2,24,3.04787,-62.3125,-2.5,2.8284,-61.04,-2.8284],
// 2 24 -3.04787 -62.3125 -2.5 -2.8284 -61.04 -2.8284
  [2,24,-3.04787,-62.3125,-2.5,-2.8284,-61.04,-2.8284],
// 2 24 -3.04787 -61.2959 -2.5 -3.04787 -62.3125 -2.5
  [2,24,-3.04787,-61.2959,-2.5,-3.04787,-62.3125,-2.5],
// 2 24 -3.04787 -62.3125 -2.5 3.04787 -62.3125 -2.5
  [2,24,-3.04787,-62.3125,-2.5,3.04787,-62.3125,-2.5],
// 2 24 3.04787 -62.3125 -2.5 3.04787 -61.2959 -2.5
  [2,24,3.04787,-62.3125,-2.5,3.04787,-61.2959,-2.5],
// 2 24 3.04791 -23.0339 -2.5 3.04787 -16.6875 -2.5
  [2,24,3.04791,-23.0339,-2.5,3.04787,-16.6875,-2.5],
// 2 24 -3.04787 -16.6875 -2.5 3.04787 -16.6875 -2.5
  [2,24,-3.04787,-16.6875,-2.5,3.04787,-16.6875,-2.5],
// 2 24 -3.04791 -25.7296 -2.5 -3.04787 -16.6875 -2.5
  [2,24,-3.04791,-25.7296,-2.5,-3.04787,-16.6875,-2.5],
// 5 24 -2.8284 -17.96 -2.8284 -2.8284 -61.04 -2.8284 -3.04787 -61.2959 -2.5 -1.5308 -21.3205 -3.6956
  [5,24,-2.8284,-17.96,-2.8284,-2.8284,-61.04,-2.8284,-3.04787,-61.2959,-2.5,-1.5308,-21.3205,-3.6956],
// 5 24 -1.5308 -21.3205 -3.6956 -1.5308 -57.6795 -3.6956 -2.8284 -61.04 -2.8284 0 -22.5 -4
  [5,24,-1.5308,-21.3205,-3.6956,-1.5308,-57.6795,-3.6956,-2.8284,-61.04,-2.8284,0,-22.5,-4],
// 5 24 0 -22.5 -4 0 -56.5 -4 -1.5308 -57.6795 -3.6956 1.5308 -21.3205 -3.6956
  [5,24,0,-22.5,-4,0,-56.5,-4,-1.5308,-57.6795,-3.6956,1.5308,-21.3205,-3.6956],
// 5 24 1.5308 -21.3205 -3.6956 1.5308 -57.6795 -3.6956 0 -56.5 -4 2.8284 -17.96 -2.8284
  [5,24,1.5308,-21.3205,-3.6956,1.5308,-57.6795,-3.6956,0,-56.5,-4,2.8284,-17.96,-2.8284],
// 5 24 2.8284 -17.96 -2.8284 2.8284 -61.04 -2.8284 1.5308 -57.6795 -3.6956 3.04791 -23.0339 -2.5
  [5,24,2.8284,-17.96,-2.8284,2.8284,-61.04,-2.8284,1.5308,-57.6795,-3.6956,3.04791,-23.0339,-2.5],
// 
// 0 // Head
// 1 16 -2.5 -65 -3.5 0 0 -1 -1 0 0 0 1 0 4-4cylc.dat
  [1,16,-2.5,-65,-3.5,0,0,-1,-1,0,0,0,1,0, ldraw_lib__4_4cylc()],
// 1 16 -0.75 -69.1 -3.5 0 0 -1 -1 0 0 0 1 0 4-4cylc.dat
  [1,16,-0.75,-69.1,-3.5,0,0,-1,-1,0,0,0,1,0, ldraw_lib__4_4cylc()],
// 1 16 1 -73.2 -3.5 0 0 -1 -1 0 0 0 1 0 4-4cylc.dat
  [1,16,1,-73.2,-3.5,0,0,-1,-1,0,0,0,1,0, ldraw_lib__4_4cylc()],
// 1 16 -2.5 -65 -2.5 0 0 -1 -1 0 0 0 1 0 4-4ndis.dat
  [1,16,-2.5,-65,-2.5,0,0,-1,-1,0,0,0,1,0, ldraw_lib__4_4ndis()],
// 1 16 -0.75 -69.1 -2.5 0 0 -1 -1 0 0 0 1 0 4-4ndis.dat
  [1,16,-0.75,-69.1,-2.5,0,0,-1,-1,0,0,0,1,0, ldraw_lib__4_4ndis()],
// 1 16 1 -73.2 -2.5 0 0 -1 -1 0 0 0 1 0 4-4ndis.dat
  [1,16,1,-73.2,-2.5,0,0,-1,-1,0,0,0,1,0, ldraw_lib__4_4ndis()],
// 
// 4 16 3.661 -79.869 -2.5 7.574 -76.049 -2.5 6.925 -78.072 -2.5 5.339 -79.491 -2.5
  [4,16,3.661,-79.869,-2.5,7.574,-76.049,-2.5,6.925,-78.072,-2.5,5.339,-79.491,-2.5],
// 4 16 -5.046 -61.46 -2.5 -5.978 -63.432 -2.5 -6.087 -62.809 -2.5 -5.728 -61.894 -2.5
  [4,16,-5.046,-61.46,-2.5,-5.978,-63.432,-2.5,-6.087,-62.809,-2.5,-5.728,-61.894,-2.5],
// 4 16 0.065 -77.5 -2.5 5.5 -72.5 -2.5 7.021 -73.995 -2.5 1.549 -79.162 -2.5
  [4,16,0.065,-77.5,-2.5,5.5,-72.5,-2.5,7.021,-73.995,-2.5,1.549,-79.162,-2.5],
// 4 16 1.549 -79.162 -2.5 7.021 -73.995 -2.5 7.574 -76.049 -2.5 3.661 -79.869 -2.5
  [4,16,1.549,-79.162,-2.5,7.021,-73.995,-2.5,7.574,-76.049,-2.5,3.661,-79.869,-2.5],
// 3 16 -3.5 -64 -2.5 -3.5 -65 -2.5 -5.978 -63.432 -2.5
  [3,16,-3.5,-64,-2.5,-3.5,-65,-2.5,-5.978,-63.432,-2.5],
// 3 16 -3.5 -65 -2.5 -3.5 -66 -2.5 -5.978 -63.432 -2.5
  [3,16,-3.5,-65,-2.5,-3.5,-66,-2.5,-5.978,-63.432,-2.5],
// 3 16 0 -74.2 -2.5 1 -74.2 -2.5 0.065 -77.5 -2.5
  [3,16,0,-74.2,-2.5,1,-74.2,-2.5,0.065,-77.5,-2.5],
// 3 16 1 -74.2 -2.5 2 -74.2 -2.5 0.065 -77.5 -2.5
  [3,16,1,-74.2,-2.5,2,-74.2,-2.5,0.065,-77.5,-2.5],
// 3 16 2 -74.2 -2.5 5.5 -72.5 -2.5 0.065 -77.5 -2.5
  [3,16,2,-74.2,-2.5,5.5,-72.5,-2.5,0.065,-77.5,-2.5],
// 3 16 2 -72.2 -2.5 5.5 -72.5 -2.5 2 -73.2 -2.5
  [3,16,2,-72.2,-2.5,5.5,-72.5,-2.5,2,-73.2,-2.5],
// 3 16 5.5 -72.5 -2.5 2 -74.2 -2.5 2 -73.2 -2.5
  [3,16,5.5,-72.5,-2.5,2,-74.2,-2.5,2,-73.2,-2.5],
// 4 16 -0.75 -70.1 -2.5 0.25 -70.1 -2.5 2 -72.2 -2.5 1 -72.2 -2.5
  [4,16,-0.75,-70.1,-2.5,0.25,-70.1,-2.5,2,-72.2,-2.5,1,-72.2,-2.5],
// 4 16 -1.75 -70.1 -2.5 -0.75 -70.1 -2.5 1 -72.2 -2.5 0 -72.2 -2.5
  [4,16,-1.75,-70.1,-2.5,-0.75,-70.1,-2.5,1,-72.2,-2.5,0,-72.2,-2.5],
// 3 16 -1.75 -70.1 -2.5 0 -72.2 -2.5 0 -73.2 -2.5
  [3,16,-1.75,-70.1,-2.5,0,-72.2,-2.5,0,-73.2,-2.5],
// 3 16 -1.75 -70.1 -2.5 0 -73.2 -2.5 0 -74.2 -2.5
  [3,16,-1.75,-70.1,-2.5,0,-73.2,-2.5,0,-74.2,-2.5],
// 4 16 -1.75 -70.1 -2.5 0 -74.2 -2.5 0.065 -77.5 -2.5 -5.978 -63.432 -2.5
  [4,16,-1.75,-70.1,-2.5,0,-74.2,-2.5,0.065,-77.5,-2.5,-5.978,-63.432,-2.5],
// 4 16 -1.75 -68.1 -2.5 -3.5 -66 -2.5 -2.5 -66 -2.5 -0.75 -68.1 -2.5
  [4,16,-1.75,-68.1,-2.5,-3.5,-66,-2.5,-2.5,-66,-2.5,-0.75,-68.1,-2.5],
// 4 16 -0.75 -68.1 -2.5 -2.5 -66 -2.5 -1.5 -66 -2.5 0.25 -68.1 -2.5
  [4,16,-0.75,-68.1,-2.5,-2.5,-66,-2.5,-1.5,-66,-2.5,0.25,-68.1,-2.5],
// 4 16 -1.75 -70.1 -2.5 -5.978 -63.432 -2.5 -3.5 -66 -2.5 -1.75 -69.1 -2.5
  [4,16,-1.75,-70.1,-2.5,-5.978,-63.432,-2.5,-3.5,-66,-2.5,-1.75,-69.1,-2.5],
// 3 16 -3.5 -66 -2.5 -1.75 -68.1 -2.5 -1.75 -69.1 -2.5
  [3,16,-3.5,-66,-2.5,-1.75,-68.1,-2.5,-1.75,-69.1,-2.5],
// 4 16 5.5 -62.302 -2.5 0.25 -69.1 -2.5 0.25 -68.1 -2.5 5.27 -61.711 -2.5
  [4,16,5.5,-62.302,-2.5,0.25,-69.1,-2.5,0.25,-68.1,-2.5,5.27,-61.711,-2.5],
// 4 16 0.25 -70.1 -2.5 0.25 -69.1 -2.5 5.5 -62.302 -2.5 5.5 -72.5 -2.5
  [4,16,0.25,-70.1,-2.5,0.25,-69.1,-2.5,5.5,-62.302,-2.5,5.5,-72.5,-2.5],
// 3 16 2 -72.2 -2.5 0.25 -70.1 -2.5 5.5 -72.5 -2.5
  [3,16,2,-72.2,-2.5,0.25,-70.1,-2.5,5.5,-72.5,-2.5],
// 4 16 -5.978 -63.432 -2.5 -5.046 -61.46 -2.5 -3.04787 -62.3125 -2.5 -3.5 -64 -2.5
  [4,16,-5.978,-63.432,-2.5,-5.046,-61.46,-2.5,-3.04787,-62.3125,-2.5,-3.5,-64,-2.5],
// 3 16 -2.5 -64 -2.5 -3.5 -64 -2.5 -3.04787 -62.3125 -2.5
  [3,16,-2.5,-64,-2.5,-3.5,-64,-2.5,-3.04787,-62.3125,-2.5],
// 4 16 -1.5 -64 -2.5 -2.5 -64 -2.5 -3.04787 -62.3125 -2.5 3.04787 -62.3125 -2.5
  [4,16,-1.5,-64,-2.5,-2.5,-64,-2.5,-3.04787,-62.3125,-2.5,3.04787,-62.3125,-2.5],
// 4 16 3.04787 -62.3125 -2.5 3.04787 -61.2959 -2.5 4.701 -61.43 -2.5 5.27 -61.711 -2.5
  [4,16,3.04787,-62.3125,-2.5,3.04787,-61.2959,-2.5,4.701,-61.43,-2.5,5.27,-61.711,-2.5],
// 4 16 0.25 -68.1 -2.5 -1.5 -64 -2.5 3.04787 -62.3125 -2.5 5.27 -61.711 -2.5
  [4,16,0.25,-68.1,-2.5,-1.5,-64,-2.5,3.04787,-62.3125,-2.5,5.27,-61.711,-2.5],
// 3 16 -1.5 -64 -2.5 0.25 -68.1 -2.5 -1.5 -65 -2.5
  [3,16,-1.5,-64,-2.5,0.25,-68.1,-2.5,-1.5,-65,-2.5],
// 3 16 0.25 -68.1 -2.5 -1.5 -66 -2.5 -1.5 -65 -2.5
  [3,16,0.25,-68.1,-2.5,-1.5,-66,-2.5,-1.5,-65,-2.5],
// 3 16 -3.04787 -62.3125 -2.5 -5.046 -61.46 -2.5 -3.04787 -61.2959 -2.5
  [3,16,-3.04787,-62.3125,-2.5,-5.046,-61.46,-2.5,-3.04787,-61.2959,-2.5],
];
makepoly(ldraw_lib__11640(), line=0.2);
